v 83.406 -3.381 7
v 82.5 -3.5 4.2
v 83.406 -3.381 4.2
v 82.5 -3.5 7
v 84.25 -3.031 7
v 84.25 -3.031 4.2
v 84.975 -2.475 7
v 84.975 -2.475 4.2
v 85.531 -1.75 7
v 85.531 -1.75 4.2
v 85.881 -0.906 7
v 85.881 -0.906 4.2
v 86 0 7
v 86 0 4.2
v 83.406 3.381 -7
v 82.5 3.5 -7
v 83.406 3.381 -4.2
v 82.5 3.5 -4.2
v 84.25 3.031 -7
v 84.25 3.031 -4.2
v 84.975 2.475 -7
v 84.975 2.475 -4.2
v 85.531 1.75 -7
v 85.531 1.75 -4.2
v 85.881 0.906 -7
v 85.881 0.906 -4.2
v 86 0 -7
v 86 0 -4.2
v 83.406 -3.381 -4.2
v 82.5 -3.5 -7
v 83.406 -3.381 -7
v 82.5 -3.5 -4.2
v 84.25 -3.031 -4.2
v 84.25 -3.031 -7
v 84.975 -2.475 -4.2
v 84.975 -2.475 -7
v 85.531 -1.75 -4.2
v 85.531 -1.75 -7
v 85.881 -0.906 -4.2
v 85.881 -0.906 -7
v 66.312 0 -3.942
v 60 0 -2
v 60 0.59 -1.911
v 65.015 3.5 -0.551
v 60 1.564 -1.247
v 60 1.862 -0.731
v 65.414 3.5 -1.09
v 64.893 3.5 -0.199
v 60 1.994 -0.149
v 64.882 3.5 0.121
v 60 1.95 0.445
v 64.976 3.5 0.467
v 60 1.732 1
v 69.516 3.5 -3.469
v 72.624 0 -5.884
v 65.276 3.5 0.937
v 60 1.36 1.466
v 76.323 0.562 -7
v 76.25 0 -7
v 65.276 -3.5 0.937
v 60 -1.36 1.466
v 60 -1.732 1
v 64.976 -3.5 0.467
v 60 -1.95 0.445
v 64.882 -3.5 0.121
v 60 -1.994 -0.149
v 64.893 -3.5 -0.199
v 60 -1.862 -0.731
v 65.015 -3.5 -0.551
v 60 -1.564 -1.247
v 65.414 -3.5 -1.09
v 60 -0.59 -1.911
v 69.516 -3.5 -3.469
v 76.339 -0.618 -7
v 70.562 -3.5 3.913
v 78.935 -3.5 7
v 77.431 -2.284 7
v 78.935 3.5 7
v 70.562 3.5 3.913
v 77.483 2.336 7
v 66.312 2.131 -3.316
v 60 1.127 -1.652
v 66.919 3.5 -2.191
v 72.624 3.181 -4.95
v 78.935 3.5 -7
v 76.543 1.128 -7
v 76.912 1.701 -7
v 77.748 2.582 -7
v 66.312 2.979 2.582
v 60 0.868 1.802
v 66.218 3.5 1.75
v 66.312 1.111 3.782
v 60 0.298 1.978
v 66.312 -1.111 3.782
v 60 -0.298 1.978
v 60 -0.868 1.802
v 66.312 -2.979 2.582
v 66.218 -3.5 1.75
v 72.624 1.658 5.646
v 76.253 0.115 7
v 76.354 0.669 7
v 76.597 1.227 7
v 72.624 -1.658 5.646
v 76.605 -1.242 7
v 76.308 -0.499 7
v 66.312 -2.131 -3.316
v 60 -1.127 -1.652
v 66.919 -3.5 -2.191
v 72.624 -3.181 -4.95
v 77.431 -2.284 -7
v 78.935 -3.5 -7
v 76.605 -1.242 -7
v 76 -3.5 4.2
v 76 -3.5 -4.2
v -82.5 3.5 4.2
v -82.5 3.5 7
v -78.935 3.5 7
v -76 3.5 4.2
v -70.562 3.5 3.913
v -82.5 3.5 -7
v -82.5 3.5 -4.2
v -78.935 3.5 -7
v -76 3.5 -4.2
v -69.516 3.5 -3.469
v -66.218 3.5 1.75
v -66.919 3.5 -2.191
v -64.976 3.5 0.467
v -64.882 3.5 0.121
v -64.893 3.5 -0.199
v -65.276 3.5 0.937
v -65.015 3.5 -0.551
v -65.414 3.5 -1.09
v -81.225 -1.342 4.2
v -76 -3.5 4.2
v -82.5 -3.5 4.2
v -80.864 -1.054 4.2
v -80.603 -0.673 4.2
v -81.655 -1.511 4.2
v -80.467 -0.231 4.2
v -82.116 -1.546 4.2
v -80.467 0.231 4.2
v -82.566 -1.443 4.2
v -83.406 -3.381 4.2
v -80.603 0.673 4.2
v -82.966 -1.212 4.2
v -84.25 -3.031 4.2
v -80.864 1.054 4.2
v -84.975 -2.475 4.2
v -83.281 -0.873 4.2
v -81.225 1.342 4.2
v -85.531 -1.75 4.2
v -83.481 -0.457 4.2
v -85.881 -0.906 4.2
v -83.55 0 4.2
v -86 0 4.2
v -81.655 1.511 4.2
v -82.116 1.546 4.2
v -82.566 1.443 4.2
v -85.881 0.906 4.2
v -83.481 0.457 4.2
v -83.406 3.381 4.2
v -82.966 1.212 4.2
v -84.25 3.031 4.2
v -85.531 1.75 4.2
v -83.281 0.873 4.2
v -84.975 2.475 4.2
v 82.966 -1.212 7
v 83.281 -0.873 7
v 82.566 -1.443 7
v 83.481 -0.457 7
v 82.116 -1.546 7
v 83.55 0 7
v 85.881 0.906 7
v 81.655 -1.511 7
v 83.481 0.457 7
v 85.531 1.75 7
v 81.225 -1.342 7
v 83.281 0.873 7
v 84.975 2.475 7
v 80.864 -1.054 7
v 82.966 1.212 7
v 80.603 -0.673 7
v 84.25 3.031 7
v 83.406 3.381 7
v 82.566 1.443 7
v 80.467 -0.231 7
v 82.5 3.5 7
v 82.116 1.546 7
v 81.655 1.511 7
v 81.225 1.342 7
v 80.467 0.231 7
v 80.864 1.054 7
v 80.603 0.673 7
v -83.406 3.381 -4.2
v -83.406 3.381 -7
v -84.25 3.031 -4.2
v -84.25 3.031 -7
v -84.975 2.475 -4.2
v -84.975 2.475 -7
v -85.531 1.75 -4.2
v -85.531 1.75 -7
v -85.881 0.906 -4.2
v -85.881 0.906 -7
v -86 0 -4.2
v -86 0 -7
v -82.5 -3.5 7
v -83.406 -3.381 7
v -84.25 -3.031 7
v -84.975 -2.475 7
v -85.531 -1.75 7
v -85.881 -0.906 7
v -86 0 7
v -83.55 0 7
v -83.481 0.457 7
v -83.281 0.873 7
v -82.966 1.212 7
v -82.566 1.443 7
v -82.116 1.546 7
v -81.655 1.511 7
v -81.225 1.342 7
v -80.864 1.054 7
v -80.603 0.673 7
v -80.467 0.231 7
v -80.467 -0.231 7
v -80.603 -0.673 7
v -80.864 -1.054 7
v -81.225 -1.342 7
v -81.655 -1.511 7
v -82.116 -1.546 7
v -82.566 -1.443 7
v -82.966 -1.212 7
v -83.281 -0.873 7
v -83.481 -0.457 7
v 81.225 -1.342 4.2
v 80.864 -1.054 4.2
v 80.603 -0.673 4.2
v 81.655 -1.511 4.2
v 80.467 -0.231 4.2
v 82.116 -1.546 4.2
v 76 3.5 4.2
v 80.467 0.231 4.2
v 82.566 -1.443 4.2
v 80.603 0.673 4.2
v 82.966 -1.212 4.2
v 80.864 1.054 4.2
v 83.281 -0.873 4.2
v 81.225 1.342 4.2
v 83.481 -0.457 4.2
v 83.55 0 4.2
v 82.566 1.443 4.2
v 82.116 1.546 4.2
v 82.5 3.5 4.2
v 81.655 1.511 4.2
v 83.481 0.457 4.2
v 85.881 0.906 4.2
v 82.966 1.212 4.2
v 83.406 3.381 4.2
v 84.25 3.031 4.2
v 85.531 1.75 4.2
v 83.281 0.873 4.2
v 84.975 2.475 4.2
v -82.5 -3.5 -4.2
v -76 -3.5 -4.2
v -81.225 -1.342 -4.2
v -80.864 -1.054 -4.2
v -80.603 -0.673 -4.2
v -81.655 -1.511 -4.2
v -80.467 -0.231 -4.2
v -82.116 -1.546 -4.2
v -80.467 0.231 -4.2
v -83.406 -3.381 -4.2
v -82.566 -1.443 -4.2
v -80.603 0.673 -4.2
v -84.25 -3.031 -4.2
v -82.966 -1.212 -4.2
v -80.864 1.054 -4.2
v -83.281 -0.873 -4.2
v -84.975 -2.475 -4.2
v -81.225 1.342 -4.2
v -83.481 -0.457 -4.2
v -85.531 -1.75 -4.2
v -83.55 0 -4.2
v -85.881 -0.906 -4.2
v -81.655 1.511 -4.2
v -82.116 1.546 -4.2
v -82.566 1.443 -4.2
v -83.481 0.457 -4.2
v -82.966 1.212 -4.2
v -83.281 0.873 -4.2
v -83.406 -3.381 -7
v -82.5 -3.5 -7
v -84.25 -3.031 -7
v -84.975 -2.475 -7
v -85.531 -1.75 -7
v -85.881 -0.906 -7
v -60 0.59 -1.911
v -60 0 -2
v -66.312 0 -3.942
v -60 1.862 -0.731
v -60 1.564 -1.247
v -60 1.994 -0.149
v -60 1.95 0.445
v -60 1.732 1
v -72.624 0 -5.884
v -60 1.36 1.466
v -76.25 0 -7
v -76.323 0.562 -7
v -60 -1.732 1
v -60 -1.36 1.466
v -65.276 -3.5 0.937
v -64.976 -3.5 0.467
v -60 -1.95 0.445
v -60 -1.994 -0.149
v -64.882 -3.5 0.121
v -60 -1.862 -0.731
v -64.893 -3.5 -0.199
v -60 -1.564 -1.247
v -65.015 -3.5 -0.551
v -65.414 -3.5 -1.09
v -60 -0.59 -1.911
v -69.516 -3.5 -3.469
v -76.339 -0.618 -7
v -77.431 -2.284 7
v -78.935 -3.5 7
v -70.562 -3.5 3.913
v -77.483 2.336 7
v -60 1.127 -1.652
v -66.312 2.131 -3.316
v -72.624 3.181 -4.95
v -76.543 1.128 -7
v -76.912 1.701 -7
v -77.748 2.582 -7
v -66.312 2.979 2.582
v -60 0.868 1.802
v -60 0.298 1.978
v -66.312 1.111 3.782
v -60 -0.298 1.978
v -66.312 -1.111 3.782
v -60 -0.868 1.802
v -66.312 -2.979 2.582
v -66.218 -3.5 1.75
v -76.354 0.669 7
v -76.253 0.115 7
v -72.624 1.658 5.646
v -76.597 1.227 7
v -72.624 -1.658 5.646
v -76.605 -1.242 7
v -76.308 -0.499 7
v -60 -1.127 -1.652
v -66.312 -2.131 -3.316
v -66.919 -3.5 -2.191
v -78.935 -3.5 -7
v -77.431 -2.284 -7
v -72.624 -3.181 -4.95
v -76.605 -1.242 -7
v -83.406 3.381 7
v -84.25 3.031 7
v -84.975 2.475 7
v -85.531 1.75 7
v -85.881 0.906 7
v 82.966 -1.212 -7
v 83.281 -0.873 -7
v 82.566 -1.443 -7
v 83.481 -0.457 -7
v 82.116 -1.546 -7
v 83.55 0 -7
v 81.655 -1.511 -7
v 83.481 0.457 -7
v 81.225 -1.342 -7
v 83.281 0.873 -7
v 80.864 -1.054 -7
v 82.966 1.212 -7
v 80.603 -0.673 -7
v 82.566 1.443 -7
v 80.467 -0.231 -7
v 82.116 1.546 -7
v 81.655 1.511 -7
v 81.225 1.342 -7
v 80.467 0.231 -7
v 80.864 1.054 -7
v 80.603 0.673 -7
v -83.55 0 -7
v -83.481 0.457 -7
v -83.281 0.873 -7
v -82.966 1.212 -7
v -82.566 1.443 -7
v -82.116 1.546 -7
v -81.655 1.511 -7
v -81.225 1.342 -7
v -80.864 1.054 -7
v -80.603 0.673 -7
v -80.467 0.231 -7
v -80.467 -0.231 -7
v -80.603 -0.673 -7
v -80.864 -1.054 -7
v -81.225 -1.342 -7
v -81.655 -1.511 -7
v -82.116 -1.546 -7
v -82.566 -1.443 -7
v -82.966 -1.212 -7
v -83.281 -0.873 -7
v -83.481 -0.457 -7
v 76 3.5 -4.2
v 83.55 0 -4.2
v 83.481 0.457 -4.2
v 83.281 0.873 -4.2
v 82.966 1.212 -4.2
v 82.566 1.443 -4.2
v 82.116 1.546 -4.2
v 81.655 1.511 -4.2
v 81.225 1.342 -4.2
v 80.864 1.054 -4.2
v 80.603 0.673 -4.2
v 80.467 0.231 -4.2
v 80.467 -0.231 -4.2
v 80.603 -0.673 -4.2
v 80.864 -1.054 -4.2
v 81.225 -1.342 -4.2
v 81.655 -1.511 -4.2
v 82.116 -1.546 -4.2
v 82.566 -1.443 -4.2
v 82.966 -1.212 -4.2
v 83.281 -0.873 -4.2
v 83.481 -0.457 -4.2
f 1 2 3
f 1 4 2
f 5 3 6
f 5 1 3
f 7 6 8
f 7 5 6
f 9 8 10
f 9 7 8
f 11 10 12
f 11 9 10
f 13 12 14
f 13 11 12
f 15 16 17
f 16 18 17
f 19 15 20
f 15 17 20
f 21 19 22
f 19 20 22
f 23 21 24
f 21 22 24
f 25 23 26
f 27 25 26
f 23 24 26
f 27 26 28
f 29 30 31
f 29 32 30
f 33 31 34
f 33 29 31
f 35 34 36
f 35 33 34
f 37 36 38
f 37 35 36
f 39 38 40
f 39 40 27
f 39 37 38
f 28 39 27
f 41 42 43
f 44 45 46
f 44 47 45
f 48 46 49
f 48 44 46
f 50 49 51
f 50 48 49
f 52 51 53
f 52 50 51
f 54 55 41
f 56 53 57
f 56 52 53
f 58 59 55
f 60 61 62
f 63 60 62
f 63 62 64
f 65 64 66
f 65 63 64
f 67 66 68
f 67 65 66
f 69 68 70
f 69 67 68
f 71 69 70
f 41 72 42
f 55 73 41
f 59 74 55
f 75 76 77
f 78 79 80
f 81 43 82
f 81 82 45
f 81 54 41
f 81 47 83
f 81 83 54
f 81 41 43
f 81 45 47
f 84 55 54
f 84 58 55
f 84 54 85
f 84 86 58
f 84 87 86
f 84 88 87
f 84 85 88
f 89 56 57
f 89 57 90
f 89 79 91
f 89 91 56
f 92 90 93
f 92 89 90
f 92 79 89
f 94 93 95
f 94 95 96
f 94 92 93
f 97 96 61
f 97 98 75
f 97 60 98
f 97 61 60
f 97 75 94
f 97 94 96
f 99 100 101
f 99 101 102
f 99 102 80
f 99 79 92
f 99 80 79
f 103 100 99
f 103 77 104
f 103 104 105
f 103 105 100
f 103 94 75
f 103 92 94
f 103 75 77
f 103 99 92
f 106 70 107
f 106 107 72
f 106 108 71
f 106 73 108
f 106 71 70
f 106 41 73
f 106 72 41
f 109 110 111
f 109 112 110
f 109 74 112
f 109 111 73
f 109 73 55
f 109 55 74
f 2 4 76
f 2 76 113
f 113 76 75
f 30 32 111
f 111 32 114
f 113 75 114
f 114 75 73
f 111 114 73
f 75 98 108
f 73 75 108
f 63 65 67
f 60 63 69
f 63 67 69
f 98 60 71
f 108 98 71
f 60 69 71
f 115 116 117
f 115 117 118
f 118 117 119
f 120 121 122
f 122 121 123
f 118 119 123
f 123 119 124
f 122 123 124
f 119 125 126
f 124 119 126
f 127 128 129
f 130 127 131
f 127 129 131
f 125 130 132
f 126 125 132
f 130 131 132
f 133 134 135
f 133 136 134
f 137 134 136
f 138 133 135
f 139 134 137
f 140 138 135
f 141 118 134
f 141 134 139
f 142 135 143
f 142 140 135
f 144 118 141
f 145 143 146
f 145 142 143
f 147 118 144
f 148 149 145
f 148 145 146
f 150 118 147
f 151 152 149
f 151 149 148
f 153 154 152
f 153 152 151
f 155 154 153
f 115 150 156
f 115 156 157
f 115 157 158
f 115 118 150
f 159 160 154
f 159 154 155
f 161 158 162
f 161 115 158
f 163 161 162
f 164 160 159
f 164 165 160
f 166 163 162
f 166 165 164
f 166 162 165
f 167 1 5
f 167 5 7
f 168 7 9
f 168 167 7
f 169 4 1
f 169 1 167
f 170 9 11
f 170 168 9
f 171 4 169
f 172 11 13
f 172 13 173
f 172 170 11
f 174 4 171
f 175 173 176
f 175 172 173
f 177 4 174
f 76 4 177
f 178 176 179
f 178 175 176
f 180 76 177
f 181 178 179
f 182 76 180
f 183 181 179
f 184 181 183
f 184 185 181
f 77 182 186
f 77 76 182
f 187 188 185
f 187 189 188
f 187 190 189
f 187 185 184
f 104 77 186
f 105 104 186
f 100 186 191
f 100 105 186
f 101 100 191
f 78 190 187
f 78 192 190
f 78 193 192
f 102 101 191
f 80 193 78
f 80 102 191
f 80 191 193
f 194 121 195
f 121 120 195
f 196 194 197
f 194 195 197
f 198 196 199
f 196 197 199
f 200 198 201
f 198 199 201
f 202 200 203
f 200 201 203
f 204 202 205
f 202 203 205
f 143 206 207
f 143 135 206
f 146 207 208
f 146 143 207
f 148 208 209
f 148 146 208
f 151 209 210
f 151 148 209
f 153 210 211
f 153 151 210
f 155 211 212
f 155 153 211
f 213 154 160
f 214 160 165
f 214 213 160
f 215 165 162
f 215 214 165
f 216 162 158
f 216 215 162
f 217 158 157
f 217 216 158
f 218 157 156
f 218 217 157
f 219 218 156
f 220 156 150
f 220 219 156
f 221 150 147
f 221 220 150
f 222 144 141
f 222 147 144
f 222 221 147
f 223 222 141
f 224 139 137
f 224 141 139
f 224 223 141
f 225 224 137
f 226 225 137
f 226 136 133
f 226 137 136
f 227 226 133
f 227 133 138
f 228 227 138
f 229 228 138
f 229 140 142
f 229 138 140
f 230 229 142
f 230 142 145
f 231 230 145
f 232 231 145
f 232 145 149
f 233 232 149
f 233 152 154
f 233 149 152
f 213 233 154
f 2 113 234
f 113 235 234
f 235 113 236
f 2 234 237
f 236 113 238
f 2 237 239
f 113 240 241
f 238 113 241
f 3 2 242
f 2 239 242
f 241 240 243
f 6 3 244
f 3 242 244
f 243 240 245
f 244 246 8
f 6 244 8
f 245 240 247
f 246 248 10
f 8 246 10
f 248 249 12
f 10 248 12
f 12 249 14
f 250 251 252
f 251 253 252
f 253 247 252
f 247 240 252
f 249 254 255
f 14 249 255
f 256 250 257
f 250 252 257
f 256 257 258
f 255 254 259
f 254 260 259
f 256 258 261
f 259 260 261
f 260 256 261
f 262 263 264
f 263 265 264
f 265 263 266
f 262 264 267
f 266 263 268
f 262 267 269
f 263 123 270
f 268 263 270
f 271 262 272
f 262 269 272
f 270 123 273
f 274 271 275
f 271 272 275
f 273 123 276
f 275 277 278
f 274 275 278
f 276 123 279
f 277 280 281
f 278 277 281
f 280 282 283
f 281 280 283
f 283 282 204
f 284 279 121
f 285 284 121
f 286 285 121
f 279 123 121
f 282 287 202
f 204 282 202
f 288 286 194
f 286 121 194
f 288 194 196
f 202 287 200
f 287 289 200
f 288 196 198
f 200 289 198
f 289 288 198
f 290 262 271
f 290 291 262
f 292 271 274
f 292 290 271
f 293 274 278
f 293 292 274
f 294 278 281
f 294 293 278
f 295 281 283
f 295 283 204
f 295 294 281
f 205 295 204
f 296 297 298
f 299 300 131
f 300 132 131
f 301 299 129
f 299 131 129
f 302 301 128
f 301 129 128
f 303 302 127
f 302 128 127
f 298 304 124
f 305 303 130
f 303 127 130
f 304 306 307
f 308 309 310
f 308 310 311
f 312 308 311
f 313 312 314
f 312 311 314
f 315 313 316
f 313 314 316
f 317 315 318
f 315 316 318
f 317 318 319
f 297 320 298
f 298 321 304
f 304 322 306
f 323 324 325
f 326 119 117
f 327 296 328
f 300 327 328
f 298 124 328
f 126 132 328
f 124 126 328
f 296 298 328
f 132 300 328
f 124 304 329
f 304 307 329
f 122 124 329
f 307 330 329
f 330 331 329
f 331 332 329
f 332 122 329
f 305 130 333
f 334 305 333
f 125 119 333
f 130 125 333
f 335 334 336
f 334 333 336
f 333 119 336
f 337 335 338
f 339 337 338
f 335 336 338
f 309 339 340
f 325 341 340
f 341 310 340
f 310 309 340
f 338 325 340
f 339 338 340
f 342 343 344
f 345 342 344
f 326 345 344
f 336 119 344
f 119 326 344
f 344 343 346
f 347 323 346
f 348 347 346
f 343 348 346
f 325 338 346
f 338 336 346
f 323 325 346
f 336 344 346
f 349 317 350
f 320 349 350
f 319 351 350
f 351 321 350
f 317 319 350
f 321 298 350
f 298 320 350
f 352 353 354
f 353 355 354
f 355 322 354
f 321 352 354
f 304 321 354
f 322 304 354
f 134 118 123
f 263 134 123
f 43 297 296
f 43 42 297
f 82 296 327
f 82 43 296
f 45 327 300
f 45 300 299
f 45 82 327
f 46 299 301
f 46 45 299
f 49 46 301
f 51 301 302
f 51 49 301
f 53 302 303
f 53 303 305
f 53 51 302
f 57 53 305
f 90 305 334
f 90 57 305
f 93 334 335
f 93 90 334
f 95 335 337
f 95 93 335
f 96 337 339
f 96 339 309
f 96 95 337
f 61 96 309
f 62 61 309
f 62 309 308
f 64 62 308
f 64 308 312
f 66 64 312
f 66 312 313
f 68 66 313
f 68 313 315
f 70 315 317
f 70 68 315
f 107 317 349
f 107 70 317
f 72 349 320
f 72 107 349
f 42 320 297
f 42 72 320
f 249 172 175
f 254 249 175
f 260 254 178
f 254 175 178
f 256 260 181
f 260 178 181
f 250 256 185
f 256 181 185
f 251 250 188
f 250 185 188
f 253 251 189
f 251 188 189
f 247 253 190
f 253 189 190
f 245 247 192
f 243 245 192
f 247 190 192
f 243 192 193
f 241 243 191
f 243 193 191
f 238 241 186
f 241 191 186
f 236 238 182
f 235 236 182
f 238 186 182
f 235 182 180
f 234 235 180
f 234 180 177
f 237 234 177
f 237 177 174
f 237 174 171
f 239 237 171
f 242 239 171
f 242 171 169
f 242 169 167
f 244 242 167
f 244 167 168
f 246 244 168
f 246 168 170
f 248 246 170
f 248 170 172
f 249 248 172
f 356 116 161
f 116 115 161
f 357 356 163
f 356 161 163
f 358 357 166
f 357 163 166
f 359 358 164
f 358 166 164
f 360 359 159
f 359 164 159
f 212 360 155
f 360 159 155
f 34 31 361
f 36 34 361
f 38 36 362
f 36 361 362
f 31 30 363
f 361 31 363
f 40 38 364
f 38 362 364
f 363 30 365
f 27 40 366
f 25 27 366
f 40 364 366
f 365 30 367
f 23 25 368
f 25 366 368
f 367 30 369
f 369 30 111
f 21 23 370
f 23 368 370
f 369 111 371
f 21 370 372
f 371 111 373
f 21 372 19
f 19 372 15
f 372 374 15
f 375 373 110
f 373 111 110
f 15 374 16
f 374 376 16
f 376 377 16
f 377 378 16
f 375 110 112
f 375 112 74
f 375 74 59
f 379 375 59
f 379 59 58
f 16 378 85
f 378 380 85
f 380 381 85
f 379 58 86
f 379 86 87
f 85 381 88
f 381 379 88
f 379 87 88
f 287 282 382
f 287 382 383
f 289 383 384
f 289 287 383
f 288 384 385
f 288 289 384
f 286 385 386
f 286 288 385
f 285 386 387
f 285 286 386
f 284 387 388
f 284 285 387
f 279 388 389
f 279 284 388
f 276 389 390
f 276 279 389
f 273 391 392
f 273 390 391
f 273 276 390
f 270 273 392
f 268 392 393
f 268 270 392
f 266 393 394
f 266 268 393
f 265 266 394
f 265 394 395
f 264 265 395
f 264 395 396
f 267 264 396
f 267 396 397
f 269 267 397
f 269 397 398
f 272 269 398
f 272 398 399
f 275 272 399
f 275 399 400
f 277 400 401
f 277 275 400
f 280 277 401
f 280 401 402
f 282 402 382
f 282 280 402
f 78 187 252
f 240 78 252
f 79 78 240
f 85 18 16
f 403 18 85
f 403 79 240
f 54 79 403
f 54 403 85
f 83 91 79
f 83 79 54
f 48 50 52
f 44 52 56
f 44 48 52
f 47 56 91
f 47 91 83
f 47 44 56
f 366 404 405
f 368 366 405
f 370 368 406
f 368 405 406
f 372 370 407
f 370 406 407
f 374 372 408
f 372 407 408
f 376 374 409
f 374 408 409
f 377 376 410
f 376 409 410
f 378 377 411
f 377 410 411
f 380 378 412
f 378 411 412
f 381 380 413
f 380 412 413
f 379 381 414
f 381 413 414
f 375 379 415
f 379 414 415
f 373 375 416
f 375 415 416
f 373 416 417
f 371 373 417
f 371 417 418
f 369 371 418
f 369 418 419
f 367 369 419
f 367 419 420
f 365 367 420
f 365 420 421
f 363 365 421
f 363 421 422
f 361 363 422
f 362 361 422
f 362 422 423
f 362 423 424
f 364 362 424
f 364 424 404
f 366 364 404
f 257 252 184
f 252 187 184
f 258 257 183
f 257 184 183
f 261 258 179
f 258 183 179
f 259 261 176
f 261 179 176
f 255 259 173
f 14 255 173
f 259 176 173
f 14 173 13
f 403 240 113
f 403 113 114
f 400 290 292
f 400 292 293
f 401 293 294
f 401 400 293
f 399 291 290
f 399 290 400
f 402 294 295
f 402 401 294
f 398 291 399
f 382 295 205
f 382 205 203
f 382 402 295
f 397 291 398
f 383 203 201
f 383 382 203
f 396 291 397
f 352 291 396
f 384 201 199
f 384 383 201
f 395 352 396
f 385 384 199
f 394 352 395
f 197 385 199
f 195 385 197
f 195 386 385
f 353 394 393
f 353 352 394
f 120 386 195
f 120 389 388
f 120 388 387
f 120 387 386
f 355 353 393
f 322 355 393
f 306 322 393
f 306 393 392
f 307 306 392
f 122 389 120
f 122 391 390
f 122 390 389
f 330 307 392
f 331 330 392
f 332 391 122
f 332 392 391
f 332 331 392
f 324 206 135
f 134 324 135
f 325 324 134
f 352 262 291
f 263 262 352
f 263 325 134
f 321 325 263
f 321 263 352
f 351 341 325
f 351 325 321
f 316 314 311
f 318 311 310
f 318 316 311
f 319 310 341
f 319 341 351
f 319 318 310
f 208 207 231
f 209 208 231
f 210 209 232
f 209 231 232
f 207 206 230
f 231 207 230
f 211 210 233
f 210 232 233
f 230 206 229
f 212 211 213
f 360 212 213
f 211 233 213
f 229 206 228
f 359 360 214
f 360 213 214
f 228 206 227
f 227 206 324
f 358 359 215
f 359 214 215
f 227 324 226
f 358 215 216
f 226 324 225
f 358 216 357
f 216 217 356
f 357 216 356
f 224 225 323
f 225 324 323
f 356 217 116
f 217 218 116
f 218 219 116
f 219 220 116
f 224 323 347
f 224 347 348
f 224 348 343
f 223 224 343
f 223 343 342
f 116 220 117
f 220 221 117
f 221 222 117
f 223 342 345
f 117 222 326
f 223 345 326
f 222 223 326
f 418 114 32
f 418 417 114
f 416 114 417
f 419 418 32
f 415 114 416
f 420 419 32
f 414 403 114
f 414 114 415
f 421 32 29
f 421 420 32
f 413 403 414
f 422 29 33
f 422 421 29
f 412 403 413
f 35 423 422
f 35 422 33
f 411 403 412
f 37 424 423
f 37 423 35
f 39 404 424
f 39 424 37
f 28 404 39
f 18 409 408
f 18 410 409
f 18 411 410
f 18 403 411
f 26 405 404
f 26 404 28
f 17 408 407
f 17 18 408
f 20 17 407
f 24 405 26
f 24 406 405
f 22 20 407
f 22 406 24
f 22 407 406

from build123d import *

# Parameters (mm, degrees)
SKETCH1_R            = 2
BOSS_EXTRUDE1_DEPTH  = 60
SKETCH3_R            = 10
SKETCH3_W            = 14
SKETCH3_H            = 7
CUT_EXTRUDE1_DEPTH   = 121.830459736
SKETCH4_W            = 10
SKETCH4_H            = 8.4
CUT_EXTRUDE2_DEPTH   = 87.567892431
SKETCH5_R            = 1.55
CUT_EXTRUDE3_DEPTH   = 88.202350886
FILLET1_R            = 3.5
FILLET1_OF_MIRROR1_R = 3.5


with BuildPart() as part:
    # Sketch1 → Boss-Extrude1 (new, symmetric)
    with BuildSketch(Plane(origin=(0, 0, 0), x_dir=(0, 0, -1), z_dir=(1, 0, 0))):
        Circle(SKETCH1_R)
    extrude(amount=BOSS_EXTRUDE1_DEPTH, both=True)

    # Sketch2 → Revolve2 (revolve)
    with BuildSketch(Plane(origin=(0, 0, 0), x_dir=(1, 0, 0), z_dir=(0, 1, 0)), mode=Mode.PRIVATE) as revolve2_sk:
        Polygon((60, -2), (86, -10), (86, 0), (60, 0), align=None)
    revolve2 = revolve(revolve2_sk.sketch.rotate(Axis((-1000, 0, 0), (1, 0, 0)), 180), axis=Axis((-1000, 0, 0), (1, 0, 0)))

    # Sketch3 → Cut-Extrude1 (cut, through all)
    with BuildSketch(Plane(origin=(60, 0, 0), x_dir=(0, 0, -1), z_dir=(1, 0, 0))):
        Circle(SKETCH3_R)
        Rectangle(SKETCH3_W, SKETCH3_H, mode=Mode.SUBTRACT)
    cut_extrude1 = extrude(amount=CUT_EXTRUDE1_DEPTH, mode=Mode.SUBTRACT)

    # Sketch4 → Cut-Extrude2 (cut, through all)
    with BuildSketch(Plane(origin=(0, 3.5, 0), x_dir=(1, 0, 0), z_dir=(0, 1, 0))):
        with Locations((81, 0)):
            Rectangle(SKETCH4_W, SKETCH4_H)
    cut_extrude2 = extrude(amount=-CUT_EXTRUDE2_DEPTH, mode=Mode.SUBTRACT)

    # Sketch5 → Cut-Extrude3 (cut, through all)
    with BuildSketch(Plane.XY.offset(7)):
        with Locations((82, 0)):
            Circle(SKETCH5_R)
    cut_extrude3 = extrude(amount=-CUT_EXTRUDE3_DEPTH, mode=Mode.SUBTRACT)

    # Fillet1
    fillet1_edges = [part.edges().sort_by_distance(p)[0] for p in [
        (86, -3.5, -5.6),
        (86, 3.5, -5.6),
        (86, -3.5, 5.6),
        (86, 3.5, 5.6),
    ]]
    fillet(fillet1_edges, radius=FILLET1_R - 0.0001)  # a hair under: the kernel refuses the full size

    # Mirror1: Revolve2, Cut-Extrude1, Cut-Extrude2, Cut-Extrude3 across plane
    add(revolve2.mirror(Plane(origin=(0, 0, 0), x_dir=(0, 0, 1), z_dir=(1, 0, 0))))
    add(cut_extrude1.mirror(Plane(origin=(0, 0, 0), x_dir=(0, 0, 1), z_dir=(1, 0, 0))), mode=Mode.SUBTRACT)
    add(cut_extrude2.mirror(Plane(origin=(0, 0, 0), x_dir=(0, 0, 1), z_dir=(1, 0, 0))), mode=Mode.SUBTRACT)
    add(cut_extrude3.mirror(Plane(origin=(0, 0, 0), x_dir=(0, 0, 1), z_dir=(1, 0, 0))), mode=Mode.SUBTRACT)

    # Fillet1 of Mirror1
    fillet1_of_mirror1_edges = [part.edges().sort_by_distance(p)[0] for p in [
        (-86, -3.5, -5.6),
        (-86, 3.5, -5.6),
        (-86, -3.5, 5.6),
        (-86, 3.5, 5.6),
    ]]
    fillet(fillet1_of_mirror1_edges, radius=FILLET1_OF_MIRROR1_R - 0.0001)  # a hair under: the kernel refuses the full size


solid = part.part
